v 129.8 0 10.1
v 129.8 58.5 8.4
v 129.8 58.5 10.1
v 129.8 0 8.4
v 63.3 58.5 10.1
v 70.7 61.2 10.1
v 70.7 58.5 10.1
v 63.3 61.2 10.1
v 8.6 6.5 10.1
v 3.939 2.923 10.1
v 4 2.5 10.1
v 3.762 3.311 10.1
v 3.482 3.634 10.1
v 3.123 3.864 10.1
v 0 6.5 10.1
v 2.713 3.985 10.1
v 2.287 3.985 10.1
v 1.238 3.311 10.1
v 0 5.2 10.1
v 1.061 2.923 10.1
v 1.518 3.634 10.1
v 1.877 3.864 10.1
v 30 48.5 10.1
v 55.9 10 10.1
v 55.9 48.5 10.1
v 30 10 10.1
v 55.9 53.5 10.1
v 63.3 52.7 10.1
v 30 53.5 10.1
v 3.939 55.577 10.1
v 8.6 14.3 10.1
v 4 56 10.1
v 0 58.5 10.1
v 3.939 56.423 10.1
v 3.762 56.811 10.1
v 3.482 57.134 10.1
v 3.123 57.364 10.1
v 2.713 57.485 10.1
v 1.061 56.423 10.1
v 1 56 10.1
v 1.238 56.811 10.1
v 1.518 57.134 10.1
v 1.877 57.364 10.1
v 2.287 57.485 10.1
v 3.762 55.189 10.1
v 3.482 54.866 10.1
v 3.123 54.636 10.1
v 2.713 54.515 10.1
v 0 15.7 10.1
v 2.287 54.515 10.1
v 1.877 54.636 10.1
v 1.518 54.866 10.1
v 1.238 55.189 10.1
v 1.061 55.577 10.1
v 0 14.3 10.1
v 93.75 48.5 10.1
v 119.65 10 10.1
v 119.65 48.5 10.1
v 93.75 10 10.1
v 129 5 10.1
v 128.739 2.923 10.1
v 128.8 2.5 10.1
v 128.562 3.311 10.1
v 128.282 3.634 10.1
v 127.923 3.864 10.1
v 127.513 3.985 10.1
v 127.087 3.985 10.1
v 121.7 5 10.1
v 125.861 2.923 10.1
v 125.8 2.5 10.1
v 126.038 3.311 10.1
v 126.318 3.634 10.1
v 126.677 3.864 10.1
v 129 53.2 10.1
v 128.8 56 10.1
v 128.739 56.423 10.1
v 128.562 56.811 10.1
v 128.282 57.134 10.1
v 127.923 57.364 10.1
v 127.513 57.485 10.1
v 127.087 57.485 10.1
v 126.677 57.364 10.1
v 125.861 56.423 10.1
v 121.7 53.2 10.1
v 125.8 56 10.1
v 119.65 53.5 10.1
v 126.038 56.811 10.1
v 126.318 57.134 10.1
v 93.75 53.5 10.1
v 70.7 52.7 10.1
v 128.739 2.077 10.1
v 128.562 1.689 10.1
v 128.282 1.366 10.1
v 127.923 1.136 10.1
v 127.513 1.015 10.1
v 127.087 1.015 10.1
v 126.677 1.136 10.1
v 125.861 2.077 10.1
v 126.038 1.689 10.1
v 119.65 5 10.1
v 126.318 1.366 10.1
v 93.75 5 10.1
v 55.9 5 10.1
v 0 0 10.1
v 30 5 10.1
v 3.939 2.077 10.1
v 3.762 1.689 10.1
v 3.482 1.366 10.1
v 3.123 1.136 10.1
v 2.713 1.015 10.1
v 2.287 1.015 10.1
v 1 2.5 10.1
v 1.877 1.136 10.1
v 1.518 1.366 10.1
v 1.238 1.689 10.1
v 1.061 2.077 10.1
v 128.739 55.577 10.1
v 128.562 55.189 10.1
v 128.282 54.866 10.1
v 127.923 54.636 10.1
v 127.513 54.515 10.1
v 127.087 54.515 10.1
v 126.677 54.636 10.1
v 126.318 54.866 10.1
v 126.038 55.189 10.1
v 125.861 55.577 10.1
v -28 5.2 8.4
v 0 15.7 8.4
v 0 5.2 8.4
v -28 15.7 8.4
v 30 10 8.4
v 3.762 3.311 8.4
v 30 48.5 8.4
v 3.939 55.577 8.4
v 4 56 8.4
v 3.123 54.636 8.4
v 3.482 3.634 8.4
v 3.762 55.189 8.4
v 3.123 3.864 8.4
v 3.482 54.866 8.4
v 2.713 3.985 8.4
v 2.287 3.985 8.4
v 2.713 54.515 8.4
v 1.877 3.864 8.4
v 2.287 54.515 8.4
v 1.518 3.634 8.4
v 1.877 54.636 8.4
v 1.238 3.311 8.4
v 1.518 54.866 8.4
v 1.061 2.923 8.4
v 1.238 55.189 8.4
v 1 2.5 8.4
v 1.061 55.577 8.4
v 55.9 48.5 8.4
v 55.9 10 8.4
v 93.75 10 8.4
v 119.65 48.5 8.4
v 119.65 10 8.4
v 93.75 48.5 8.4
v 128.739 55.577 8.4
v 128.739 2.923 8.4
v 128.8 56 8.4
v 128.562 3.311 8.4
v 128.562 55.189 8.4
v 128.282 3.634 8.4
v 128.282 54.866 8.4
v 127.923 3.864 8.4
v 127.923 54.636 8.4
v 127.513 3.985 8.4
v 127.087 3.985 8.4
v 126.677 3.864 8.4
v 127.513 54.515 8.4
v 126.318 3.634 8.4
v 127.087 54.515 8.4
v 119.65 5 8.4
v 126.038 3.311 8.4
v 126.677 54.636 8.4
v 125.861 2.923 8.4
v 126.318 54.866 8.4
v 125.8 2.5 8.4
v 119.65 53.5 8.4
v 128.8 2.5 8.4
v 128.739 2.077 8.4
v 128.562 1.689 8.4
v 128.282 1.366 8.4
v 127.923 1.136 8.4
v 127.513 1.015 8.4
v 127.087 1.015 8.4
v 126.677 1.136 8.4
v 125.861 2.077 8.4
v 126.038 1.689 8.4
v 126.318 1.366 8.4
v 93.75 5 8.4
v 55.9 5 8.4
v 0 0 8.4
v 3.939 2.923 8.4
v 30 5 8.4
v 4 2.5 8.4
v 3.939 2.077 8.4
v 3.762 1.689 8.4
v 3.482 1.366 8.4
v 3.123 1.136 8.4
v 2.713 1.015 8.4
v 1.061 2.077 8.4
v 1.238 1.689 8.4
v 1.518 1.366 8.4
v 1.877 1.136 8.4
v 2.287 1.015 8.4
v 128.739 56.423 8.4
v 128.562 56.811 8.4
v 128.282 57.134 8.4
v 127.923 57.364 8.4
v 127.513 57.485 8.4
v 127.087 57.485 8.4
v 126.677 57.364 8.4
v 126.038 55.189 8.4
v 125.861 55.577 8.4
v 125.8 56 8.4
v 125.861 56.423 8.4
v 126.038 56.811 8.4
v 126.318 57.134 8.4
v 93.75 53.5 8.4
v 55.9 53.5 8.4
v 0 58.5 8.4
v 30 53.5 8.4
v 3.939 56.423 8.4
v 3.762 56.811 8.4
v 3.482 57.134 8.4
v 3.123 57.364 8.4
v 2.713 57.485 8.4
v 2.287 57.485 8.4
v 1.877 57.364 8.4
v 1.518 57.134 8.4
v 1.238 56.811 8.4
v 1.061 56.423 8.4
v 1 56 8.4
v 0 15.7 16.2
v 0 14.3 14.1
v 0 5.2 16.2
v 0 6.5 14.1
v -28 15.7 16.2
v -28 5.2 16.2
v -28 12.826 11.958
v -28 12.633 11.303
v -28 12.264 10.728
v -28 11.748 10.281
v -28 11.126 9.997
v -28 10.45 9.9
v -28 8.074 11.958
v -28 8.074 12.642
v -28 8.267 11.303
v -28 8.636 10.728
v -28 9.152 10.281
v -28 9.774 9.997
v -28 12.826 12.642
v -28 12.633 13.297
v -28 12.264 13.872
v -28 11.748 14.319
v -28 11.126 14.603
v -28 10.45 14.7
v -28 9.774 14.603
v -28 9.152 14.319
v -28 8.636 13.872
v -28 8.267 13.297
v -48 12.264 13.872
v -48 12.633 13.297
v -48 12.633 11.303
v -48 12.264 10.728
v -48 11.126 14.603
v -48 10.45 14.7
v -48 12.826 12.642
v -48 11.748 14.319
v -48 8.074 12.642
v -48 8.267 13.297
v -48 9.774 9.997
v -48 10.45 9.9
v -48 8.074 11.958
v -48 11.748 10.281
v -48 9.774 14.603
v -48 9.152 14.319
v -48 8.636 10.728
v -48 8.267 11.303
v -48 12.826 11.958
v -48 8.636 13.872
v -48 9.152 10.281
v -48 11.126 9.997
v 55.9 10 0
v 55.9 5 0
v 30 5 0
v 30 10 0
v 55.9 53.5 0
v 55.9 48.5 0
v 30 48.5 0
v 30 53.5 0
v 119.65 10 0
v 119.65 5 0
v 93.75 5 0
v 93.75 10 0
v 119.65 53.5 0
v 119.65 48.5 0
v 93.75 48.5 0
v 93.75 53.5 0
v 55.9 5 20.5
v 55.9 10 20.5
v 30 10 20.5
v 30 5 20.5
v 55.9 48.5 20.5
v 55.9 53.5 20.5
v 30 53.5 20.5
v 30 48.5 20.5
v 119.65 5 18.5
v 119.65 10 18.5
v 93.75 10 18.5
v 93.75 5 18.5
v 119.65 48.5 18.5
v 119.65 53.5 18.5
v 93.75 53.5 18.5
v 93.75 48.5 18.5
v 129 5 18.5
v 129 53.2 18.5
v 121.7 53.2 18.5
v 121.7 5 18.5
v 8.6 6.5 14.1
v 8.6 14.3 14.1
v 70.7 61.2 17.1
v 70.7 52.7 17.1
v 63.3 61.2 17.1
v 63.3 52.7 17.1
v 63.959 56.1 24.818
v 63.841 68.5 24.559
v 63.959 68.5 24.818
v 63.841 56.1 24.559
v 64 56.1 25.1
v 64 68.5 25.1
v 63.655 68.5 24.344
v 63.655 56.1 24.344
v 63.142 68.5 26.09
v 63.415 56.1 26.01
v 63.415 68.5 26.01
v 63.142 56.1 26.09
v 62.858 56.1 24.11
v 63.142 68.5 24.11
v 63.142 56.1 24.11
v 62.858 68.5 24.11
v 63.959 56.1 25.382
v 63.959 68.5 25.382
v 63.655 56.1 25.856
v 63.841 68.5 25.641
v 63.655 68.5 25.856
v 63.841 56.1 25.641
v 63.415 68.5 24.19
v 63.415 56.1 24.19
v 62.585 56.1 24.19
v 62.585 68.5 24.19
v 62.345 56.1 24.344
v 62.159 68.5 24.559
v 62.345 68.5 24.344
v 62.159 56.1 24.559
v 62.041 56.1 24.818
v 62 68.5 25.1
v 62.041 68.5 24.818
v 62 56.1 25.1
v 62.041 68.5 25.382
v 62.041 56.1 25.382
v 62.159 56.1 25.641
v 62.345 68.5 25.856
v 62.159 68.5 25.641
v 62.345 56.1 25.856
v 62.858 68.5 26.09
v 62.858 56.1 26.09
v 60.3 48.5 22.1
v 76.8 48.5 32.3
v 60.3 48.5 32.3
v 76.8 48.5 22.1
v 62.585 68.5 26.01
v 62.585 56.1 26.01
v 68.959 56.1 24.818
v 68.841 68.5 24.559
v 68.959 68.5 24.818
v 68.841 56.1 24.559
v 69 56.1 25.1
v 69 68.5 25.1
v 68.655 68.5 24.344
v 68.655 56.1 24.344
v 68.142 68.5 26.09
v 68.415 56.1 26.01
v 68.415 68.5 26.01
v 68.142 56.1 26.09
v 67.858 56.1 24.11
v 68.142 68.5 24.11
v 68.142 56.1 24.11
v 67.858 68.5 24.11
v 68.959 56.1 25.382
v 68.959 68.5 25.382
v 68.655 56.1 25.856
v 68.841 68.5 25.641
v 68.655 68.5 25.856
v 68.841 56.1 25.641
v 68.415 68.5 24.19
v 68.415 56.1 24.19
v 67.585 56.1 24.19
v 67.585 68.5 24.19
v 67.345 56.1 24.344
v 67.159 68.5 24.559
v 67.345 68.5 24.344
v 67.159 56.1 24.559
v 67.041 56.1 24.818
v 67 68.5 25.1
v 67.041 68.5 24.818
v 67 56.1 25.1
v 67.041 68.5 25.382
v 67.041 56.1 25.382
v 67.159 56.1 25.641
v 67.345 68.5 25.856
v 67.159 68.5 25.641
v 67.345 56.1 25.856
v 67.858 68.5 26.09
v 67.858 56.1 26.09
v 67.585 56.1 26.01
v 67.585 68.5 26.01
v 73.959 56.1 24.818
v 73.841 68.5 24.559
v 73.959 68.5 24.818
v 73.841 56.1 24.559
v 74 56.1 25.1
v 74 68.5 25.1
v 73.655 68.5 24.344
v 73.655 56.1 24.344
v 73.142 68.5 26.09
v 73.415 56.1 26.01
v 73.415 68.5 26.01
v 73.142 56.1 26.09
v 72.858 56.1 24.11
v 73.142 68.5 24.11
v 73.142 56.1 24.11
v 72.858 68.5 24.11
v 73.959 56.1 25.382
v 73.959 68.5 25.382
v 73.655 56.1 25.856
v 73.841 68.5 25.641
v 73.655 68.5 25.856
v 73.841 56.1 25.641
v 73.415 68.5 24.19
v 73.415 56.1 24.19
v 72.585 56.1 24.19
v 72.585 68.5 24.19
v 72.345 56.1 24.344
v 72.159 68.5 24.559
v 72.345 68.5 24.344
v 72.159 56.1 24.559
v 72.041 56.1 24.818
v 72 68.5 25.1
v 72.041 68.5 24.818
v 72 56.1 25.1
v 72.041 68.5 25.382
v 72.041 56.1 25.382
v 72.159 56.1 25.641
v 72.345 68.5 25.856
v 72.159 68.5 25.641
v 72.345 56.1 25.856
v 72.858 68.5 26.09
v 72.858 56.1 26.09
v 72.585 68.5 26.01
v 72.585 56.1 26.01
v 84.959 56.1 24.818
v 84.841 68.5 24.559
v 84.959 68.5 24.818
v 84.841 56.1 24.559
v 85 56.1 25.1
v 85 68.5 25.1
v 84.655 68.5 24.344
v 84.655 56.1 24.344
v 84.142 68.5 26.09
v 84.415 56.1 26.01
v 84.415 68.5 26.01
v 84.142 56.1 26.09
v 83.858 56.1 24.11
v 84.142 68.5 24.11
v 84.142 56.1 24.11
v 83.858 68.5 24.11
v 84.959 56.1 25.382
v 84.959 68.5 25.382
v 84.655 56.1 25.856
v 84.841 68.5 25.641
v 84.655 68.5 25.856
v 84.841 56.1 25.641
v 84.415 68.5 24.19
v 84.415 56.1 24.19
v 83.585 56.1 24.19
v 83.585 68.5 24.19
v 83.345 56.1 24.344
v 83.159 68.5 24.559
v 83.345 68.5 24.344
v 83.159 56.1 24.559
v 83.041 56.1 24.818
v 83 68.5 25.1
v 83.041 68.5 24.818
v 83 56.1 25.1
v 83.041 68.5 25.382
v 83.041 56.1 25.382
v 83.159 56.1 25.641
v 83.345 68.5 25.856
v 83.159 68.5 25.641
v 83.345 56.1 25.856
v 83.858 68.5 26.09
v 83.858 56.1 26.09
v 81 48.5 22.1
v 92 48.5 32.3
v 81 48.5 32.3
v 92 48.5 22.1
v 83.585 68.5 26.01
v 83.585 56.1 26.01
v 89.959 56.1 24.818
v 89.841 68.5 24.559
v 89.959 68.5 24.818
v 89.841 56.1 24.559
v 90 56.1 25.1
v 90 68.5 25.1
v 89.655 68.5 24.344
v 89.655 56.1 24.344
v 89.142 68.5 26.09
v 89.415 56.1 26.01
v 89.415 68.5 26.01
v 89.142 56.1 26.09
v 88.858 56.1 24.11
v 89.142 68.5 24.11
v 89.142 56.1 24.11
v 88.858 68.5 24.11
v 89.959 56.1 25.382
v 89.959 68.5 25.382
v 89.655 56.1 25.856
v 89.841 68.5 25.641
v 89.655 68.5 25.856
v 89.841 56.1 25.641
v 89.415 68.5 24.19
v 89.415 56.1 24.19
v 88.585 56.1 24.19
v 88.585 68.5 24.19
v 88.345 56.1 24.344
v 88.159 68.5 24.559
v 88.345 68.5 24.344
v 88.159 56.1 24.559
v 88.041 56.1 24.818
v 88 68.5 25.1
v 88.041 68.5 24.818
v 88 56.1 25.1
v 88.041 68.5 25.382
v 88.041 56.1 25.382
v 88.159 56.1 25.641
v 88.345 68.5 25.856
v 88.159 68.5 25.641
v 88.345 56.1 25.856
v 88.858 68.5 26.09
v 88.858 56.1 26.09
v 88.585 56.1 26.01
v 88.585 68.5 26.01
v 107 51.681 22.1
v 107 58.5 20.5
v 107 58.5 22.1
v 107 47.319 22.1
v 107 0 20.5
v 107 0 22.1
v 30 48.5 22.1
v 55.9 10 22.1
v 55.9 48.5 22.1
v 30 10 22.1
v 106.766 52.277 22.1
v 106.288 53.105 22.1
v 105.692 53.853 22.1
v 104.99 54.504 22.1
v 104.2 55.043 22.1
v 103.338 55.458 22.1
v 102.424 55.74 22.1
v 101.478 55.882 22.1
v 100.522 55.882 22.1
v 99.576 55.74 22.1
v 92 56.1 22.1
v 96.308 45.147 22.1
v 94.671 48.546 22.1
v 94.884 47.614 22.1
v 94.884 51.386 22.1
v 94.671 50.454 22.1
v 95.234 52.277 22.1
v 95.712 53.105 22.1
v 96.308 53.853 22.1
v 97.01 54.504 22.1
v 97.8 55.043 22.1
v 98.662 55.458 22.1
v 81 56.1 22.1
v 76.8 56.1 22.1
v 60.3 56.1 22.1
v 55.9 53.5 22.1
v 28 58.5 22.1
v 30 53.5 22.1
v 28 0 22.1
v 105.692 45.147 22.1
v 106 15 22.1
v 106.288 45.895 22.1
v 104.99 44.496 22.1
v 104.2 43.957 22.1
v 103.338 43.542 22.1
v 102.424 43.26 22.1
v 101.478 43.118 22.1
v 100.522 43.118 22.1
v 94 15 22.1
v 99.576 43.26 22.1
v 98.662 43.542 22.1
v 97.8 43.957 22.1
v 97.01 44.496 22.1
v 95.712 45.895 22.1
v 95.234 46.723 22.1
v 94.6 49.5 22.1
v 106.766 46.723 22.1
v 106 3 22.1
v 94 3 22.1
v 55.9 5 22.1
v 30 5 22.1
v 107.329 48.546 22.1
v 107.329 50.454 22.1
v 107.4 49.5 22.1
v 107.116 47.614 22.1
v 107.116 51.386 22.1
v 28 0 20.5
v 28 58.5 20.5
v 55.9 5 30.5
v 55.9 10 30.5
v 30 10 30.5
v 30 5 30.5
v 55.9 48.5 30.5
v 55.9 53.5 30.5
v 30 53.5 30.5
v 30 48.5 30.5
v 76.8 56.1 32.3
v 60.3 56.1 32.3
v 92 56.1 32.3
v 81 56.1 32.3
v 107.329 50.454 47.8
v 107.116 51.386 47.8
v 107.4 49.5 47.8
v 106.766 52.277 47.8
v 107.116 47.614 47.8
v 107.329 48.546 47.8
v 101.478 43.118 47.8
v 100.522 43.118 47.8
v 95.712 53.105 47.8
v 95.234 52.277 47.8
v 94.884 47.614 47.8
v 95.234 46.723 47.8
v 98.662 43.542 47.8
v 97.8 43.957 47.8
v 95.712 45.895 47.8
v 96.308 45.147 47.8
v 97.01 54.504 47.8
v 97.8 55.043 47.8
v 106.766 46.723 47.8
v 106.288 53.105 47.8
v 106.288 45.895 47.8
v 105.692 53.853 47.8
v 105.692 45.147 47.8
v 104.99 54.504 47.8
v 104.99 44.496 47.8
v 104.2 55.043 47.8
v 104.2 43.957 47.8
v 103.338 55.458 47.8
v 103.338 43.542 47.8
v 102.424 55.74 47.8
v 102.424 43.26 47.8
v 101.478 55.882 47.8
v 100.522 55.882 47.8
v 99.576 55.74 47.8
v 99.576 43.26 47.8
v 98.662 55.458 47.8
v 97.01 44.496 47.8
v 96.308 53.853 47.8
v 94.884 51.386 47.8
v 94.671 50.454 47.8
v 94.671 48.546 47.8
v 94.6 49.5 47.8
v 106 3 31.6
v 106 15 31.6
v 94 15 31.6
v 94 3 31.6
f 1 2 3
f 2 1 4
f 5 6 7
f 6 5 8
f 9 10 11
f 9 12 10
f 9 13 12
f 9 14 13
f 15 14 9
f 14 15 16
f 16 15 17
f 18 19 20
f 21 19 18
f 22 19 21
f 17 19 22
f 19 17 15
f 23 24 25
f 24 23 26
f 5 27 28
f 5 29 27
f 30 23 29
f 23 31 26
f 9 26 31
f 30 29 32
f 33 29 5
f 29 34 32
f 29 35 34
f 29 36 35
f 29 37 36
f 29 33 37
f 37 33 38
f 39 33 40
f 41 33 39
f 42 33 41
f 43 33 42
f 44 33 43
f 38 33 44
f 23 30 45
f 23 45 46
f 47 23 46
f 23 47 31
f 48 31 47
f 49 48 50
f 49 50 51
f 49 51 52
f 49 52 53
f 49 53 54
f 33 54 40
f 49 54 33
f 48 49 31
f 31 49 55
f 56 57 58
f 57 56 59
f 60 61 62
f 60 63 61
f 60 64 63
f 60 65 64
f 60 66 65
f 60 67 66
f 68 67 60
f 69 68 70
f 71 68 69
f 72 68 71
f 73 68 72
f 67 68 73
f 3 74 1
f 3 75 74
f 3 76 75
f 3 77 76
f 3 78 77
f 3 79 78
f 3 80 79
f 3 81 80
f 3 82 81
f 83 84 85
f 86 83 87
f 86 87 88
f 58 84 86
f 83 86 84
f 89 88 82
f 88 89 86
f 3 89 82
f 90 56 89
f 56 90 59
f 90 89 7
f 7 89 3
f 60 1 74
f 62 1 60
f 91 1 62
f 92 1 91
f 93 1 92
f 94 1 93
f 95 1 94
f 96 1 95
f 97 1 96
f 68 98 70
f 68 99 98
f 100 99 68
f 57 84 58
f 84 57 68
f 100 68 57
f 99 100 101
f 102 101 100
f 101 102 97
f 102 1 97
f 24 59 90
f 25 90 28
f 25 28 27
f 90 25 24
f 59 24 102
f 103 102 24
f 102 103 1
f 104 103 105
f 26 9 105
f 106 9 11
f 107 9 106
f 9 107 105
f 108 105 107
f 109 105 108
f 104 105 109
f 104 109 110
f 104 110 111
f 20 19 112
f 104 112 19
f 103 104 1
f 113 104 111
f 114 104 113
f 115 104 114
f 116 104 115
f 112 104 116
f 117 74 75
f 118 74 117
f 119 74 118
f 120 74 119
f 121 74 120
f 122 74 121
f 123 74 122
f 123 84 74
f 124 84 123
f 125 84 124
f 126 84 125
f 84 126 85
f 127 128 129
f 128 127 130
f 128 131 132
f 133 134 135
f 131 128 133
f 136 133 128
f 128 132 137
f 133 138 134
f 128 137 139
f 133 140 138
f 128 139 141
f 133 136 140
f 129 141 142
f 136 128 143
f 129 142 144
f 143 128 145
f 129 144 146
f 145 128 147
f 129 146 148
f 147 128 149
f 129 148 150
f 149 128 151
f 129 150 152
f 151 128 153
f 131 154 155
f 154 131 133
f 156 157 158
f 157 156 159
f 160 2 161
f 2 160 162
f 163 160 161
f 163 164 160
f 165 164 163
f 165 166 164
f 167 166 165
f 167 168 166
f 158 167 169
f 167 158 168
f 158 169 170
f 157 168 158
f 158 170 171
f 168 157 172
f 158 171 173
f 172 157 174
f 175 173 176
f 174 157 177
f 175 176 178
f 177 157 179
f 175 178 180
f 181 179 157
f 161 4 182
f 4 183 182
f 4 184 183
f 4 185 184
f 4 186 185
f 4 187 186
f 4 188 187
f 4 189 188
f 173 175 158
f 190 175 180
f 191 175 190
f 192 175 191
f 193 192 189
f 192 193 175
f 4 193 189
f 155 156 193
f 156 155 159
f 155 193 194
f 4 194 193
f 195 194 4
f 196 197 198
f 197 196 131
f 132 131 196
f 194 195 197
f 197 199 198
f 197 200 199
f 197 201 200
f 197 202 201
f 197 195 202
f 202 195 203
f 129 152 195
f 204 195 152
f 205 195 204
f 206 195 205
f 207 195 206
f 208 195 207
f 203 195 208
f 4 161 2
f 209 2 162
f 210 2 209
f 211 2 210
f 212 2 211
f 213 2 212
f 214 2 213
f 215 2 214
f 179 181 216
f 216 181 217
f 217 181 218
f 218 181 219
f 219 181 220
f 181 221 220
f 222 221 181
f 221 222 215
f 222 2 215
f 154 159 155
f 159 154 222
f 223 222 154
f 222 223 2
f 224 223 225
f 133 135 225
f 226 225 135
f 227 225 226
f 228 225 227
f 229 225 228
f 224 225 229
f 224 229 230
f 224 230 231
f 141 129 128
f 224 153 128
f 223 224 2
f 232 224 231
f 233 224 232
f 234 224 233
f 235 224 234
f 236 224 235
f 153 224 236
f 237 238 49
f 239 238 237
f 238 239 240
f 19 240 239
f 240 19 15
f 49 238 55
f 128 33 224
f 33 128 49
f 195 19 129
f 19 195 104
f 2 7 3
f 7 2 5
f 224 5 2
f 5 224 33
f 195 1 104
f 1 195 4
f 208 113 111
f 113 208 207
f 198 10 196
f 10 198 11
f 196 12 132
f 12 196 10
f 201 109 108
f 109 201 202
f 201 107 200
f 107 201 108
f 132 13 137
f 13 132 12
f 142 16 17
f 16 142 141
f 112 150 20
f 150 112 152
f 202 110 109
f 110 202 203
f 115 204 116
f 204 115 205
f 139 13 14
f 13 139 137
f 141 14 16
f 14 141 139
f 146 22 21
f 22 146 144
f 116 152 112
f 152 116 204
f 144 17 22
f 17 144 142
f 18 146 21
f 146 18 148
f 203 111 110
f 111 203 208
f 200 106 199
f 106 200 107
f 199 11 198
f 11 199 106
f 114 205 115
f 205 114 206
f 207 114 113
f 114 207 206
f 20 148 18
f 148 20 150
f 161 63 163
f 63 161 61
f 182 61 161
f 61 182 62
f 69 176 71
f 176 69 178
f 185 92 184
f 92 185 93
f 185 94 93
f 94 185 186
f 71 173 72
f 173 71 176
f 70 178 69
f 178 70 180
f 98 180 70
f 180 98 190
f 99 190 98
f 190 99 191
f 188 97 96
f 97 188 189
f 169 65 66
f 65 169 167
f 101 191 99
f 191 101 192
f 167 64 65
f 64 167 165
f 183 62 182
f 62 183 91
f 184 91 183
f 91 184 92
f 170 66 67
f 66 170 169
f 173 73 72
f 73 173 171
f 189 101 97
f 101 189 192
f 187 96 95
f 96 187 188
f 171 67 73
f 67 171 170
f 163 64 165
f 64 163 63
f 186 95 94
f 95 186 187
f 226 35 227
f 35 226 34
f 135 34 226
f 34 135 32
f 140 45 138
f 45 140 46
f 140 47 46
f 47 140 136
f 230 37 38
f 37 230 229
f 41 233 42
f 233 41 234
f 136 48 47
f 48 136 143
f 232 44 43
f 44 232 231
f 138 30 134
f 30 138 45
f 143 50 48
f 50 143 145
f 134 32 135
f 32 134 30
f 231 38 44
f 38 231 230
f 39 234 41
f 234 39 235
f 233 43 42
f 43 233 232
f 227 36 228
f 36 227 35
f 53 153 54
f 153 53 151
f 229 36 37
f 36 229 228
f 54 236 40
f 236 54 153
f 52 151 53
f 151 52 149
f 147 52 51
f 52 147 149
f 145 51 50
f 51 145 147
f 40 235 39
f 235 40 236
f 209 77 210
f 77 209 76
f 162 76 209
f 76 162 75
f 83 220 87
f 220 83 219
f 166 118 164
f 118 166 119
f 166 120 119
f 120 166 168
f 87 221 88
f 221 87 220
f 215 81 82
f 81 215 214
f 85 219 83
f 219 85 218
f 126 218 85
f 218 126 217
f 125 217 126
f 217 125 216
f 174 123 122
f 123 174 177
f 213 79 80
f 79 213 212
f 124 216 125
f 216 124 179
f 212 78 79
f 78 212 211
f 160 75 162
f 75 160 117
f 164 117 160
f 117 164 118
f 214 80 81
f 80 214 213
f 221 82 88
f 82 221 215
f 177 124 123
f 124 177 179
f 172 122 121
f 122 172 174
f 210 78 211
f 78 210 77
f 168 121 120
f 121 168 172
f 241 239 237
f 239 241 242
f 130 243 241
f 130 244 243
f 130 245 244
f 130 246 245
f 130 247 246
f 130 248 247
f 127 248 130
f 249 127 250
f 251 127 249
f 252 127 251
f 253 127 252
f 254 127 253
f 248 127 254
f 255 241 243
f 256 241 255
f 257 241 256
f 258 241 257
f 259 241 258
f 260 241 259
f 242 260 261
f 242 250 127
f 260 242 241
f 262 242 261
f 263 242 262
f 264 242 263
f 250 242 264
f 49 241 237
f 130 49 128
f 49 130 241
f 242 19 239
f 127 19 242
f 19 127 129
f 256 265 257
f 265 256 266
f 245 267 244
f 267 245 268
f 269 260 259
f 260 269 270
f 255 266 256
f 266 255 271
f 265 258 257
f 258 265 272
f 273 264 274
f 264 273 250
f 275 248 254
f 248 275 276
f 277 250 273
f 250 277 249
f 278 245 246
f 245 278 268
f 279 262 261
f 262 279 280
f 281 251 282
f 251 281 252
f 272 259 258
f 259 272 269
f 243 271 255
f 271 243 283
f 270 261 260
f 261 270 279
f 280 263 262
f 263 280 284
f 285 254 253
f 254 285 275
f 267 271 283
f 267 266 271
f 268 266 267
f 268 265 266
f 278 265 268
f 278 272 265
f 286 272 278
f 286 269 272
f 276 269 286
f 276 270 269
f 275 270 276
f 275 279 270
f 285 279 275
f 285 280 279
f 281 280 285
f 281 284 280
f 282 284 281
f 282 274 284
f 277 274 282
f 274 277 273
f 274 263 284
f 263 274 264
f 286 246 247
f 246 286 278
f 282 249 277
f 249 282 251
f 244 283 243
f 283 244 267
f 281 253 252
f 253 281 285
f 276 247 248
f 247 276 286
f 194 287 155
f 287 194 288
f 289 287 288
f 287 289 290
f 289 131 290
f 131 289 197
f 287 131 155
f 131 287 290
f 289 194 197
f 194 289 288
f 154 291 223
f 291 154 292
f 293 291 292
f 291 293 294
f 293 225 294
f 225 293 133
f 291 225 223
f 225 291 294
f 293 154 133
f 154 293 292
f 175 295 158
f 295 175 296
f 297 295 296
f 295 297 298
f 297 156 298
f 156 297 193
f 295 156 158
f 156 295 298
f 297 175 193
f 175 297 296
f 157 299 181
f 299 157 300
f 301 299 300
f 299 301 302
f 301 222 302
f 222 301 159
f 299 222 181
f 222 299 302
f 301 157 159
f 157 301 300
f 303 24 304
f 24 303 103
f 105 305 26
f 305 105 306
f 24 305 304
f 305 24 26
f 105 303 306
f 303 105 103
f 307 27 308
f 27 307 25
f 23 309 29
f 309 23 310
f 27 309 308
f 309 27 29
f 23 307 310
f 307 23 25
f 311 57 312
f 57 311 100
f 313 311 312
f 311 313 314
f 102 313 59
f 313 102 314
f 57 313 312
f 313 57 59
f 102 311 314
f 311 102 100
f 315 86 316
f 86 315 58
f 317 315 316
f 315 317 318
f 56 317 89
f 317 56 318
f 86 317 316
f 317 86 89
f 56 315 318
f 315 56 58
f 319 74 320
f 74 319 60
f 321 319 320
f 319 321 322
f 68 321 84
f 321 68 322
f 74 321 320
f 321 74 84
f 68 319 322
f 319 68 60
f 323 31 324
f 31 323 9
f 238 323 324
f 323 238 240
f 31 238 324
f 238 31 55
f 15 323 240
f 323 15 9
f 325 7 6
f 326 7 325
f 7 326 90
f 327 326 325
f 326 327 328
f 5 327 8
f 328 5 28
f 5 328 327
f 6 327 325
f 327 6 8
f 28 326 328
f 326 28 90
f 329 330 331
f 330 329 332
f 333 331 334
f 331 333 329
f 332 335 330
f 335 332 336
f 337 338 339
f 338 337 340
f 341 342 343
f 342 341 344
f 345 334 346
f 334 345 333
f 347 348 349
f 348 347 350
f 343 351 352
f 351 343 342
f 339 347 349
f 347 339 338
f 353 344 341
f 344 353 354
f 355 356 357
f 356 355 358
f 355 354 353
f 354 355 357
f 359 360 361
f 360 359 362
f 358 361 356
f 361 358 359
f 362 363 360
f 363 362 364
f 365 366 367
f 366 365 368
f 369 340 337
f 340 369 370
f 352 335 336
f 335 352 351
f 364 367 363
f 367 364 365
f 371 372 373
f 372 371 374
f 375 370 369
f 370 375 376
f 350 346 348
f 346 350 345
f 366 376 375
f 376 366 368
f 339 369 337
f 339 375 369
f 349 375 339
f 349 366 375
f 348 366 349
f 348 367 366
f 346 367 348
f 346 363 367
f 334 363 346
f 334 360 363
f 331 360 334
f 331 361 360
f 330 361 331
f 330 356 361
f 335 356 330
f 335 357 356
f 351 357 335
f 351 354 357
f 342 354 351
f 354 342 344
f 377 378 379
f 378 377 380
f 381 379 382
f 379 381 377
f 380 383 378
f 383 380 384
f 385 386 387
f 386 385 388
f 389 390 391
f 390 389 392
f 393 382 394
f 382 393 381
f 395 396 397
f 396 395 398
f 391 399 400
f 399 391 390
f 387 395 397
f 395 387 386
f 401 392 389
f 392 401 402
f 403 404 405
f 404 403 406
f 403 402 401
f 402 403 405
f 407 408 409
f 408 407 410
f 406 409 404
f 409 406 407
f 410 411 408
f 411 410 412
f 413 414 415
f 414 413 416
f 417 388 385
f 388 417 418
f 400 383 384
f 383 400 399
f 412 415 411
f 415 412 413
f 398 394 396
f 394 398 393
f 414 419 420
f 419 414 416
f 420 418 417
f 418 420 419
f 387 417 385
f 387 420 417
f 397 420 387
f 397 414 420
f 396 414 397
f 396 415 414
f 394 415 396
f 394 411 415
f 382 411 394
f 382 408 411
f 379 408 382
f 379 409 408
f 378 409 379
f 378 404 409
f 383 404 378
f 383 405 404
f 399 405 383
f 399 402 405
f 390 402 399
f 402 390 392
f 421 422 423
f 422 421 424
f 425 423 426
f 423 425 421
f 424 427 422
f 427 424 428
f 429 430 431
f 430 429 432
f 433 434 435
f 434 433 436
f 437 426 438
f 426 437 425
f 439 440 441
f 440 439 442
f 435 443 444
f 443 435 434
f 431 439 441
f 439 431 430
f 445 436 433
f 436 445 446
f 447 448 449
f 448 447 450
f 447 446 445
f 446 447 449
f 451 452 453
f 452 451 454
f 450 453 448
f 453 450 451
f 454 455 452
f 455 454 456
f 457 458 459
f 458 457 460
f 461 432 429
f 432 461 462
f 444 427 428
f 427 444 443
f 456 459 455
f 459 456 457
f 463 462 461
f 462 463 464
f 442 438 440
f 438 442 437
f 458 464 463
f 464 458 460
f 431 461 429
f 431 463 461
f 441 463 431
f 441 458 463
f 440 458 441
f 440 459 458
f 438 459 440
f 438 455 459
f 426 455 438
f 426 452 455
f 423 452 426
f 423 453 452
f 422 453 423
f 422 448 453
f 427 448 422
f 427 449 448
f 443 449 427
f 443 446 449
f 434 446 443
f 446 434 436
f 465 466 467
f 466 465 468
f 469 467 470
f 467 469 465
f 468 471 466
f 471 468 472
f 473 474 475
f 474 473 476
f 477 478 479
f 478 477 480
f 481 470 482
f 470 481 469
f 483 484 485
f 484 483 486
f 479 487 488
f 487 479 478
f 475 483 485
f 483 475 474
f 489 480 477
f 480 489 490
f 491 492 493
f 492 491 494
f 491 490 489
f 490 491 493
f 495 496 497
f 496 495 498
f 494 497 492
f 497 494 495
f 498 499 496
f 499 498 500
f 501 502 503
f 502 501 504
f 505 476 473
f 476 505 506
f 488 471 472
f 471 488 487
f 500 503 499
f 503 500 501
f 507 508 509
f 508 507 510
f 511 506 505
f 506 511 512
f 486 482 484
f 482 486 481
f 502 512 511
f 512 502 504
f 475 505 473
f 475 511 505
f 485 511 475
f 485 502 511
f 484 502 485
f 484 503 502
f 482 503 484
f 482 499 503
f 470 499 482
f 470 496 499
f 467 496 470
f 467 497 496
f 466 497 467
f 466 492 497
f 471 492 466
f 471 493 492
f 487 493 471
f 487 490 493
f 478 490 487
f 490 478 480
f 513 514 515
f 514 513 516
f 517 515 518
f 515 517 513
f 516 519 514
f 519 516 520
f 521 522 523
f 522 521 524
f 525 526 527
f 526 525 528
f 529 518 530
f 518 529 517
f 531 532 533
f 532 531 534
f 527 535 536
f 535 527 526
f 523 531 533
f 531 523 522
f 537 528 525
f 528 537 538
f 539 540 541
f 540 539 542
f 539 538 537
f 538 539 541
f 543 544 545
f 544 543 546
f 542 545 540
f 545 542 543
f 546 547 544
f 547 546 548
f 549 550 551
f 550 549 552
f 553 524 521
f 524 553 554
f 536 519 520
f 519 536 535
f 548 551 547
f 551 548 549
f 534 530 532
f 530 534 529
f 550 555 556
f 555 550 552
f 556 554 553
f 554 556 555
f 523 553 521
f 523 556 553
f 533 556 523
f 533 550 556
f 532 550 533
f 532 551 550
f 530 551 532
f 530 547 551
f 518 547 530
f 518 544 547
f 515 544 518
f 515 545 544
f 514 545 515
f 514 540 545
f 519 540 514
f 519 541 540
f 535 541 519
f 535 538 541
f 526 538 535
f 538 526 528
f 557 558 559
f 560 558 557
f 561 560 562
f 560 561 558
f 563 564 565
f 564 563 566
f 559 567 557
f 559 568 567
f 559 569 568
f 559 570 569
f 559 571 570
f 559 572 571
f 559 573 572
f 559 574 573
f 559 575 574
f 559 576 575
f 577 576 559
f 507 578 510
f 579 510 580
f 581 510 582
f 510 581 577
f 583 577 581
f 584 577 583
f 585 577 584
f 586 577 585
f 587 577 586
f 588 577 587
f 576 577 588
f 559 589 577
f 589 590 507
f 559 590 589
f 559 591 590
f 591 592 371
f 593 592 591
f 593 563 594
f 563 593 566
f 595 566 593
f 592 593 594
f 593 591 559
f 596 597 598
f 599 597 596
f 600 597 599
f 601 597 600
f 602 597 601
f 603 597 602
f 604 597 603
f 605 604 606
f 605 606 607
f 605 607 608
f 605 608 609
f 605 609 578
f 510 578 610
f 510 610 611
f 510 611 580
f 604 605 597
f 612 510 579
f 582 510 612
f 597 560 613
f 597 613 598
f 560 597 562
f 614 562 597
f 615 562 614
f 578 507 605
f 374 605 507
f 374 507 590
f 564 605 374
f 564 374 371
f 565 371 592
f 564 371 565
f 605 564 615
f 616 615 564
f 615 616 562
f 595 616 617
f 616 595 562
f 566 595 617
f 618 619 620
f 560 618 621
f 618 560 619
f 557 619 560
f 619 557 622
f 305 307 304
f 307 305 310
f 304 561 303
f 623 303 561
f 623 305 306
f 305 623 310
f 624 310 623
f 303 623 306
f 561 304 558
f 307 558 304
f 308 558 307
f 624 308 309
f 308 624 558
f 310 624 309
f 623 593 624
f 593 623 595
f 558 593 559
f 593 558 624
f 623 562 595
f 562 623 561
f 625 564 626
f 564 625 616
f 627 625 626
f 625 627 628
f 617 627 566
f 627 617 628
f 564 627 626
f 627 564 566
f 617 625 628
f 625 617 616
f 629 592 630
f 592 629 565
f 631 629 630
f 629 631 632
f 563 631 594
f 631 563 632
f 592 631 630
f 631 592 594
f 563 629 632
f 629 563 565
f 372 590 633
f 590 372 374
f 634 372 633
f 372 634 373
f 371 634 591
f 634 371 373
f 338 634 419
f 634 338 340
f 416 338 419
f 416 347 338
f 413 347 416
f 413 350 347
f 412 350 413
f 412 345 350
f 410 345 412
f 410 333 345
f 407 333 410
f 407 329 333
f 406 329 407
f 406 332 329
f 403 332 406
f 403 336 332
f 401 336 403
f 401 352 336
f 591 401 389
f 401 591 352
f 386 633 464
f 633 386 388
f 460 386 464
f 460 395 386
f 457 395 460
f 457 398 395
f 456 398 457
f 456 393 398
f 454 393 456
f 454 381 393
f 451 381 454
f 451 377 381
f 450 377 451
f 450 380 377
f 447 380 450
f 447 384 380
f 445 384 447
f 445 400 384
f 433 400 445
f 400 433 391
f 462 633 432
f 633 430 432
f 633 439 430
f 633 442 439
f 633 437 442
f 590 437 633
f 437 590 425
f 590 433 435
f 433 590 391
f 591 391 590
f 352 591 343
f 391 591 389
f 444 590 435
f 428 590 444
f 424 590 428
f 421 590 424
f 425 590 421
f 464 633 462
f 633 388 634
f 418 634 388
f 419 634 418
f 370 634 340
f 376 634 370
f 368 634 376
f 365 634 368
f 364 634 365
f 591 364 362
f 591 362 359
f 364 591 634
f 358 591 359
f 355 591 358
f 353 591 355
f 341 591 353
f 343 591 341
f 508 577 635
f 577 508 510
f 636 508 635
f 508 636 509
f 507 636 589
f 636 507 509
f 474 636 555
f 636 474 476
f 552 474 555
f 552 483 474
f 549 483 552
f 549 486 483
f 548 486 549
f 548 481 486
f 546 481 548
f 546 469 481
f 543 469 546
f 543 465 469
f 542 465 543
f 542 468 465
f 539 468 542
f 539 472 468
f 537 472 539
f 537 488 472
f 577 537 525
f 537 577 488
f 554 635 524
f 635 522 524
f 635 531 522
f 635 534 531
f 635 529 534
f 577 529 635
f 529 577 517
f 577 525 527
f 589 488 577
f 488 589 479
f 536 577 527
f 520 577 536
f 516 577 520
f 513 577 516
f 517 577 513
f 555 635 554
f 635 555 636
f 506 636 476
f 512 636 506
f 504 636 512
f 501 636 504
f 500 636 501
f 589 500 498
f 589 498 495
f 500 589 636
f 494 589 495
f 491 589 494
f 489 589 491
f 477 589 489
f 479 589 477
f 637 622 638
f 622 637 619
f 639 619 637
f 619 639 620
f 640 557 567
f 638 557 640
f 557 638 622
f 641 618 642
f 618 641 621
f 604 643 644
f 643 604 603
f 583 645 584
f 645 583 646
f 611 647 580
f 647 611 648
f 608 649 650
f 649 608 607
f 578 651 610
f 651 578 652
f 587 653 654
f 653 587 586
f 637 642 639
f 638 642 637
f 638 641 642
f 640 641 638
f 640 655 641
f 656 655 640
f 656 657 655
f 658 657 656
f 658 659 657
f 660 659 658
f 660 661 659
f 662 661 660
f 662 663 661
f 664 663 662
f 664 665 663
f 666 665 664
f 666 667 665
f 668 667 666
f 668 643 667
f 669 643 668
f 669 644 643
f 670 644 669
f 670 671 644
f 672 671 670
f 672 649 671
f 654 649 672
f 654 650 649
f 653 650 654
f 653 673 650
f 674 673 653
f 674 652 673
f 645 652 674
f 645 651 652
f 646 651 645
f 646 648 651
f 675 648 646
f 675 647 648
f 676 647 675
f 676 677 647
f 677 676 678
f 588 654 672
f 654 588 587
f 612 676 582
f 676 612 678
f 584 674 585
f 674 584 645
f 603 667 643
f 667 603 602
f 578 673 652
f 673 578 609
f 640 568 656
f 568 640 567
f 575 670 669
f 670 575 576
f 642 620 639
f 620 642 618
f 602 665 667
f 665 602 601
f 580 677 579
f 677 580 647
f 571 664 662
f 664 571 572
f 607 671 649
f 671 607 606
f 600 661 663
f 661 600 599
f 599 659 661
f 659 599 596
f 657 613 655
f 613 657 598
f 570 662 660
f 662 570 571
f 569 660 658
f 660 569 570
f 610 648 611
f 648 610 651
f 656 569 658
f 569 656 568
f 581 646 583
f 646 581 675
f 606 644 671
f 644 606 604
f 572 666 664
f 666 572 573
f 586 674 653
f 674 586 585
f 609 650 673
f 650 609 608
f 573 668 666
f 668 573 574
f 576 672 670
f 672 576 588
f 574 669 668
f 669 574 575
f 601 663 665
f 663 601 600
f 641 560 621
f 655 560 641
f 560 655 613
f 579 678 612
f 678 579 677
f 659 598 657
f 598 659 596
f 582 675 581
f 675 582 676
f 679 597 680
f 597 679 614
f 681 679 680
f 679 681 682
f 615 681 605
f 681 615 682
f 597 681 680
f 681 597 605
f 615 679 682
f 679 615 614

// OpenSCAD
// file: rounder.scad
// rounder.scad
// cutting tool for rounding off corners with a cylinder

//---------------------
module rounder(
r=10,   // radius
h=10,   // height
f=22,    // $fn
extra=0.01  // extra size for the cube
){

difference(){
  translate([-extra,-extra,-extra])
  cube([r+extra,r+extra,h+2*extra]);
  translate([r,r,-1])
  cylinder(r=r,h=h+2,$fn=f);
}

}

//---------------------------------------------------------------------------
module bevel(x=1,y=1,h=10){

linear_extrude(height=h)
polygon(points=[[0,0],[x,0],[0,y]]);
    
}
  

//========================

rounder();

//========================
// main file
//=================================================================================
// ti.scad
//
// TI LaunchpadXL and BoostXL GaN inverter
//
// Dr Tom Flint, 17 Nov 2021
//=================================================================================


use <../Parts/rounder.scad>

//---------------------------------------------------------------------
module launch(tol=0,usb=1){


  // pcb
  difference(){
    color("DarkMagenta")
    translate([0,0,8.4])
    cube([129.8,58.5,1.7]);
    
    // mounting holes
    translate([2.5,2.5,0])
    cylinder(r=1.5,h=20,$fn=22);
    translate([129.8-2.5,2.5,0])
    cylinder(r=1.5,h=20,$fn=22);
    translate([2.5,58.5-2.5,0])
    cylinder(r=1.5,h=20,$fn=22);
    translate([129.8-2.5,58.5-2.5,0])
    cylinder(r=1.5,h=20,$fn=22);

  }
  
  // bottom side headers, from measurement not drawings
  color("black")
  translate([30,5,0])
  cube([25.9,5.0,8.4]);
  color("black")
  translate([30,48.5,0])
  cube([25.9,5.0,8.4]);
  color("black")
  translate([93.75,5,0])
  cube([25.9,5.0,8.4]);
  color("black")
  translate([93.75,48.5,0])
  cube([25.9,5.0,8.4]);

  // top side headers, from measurement not drawings
  color("gray")
  translate([30,5,8.4+1.7])
  cube([25.9,5.0,8.4]);
  color("gray")
  translate([30,48.5,8.4+1.7])
  cube([25.9,5.0,8.4]);
  color("gray")
  translate([93.75,5,8.4+1.7])
  cube([25.9,5.0,8.4]);
  color("gray")
  translate([93.75,48.5,8.4+1.7])
  cube([25.9,5.0,8.4]);

  // end row of pins
  color("gray")
  translate([121.7,5,8.4+1.7])
  cube([7.3,48.2,8.4]);

  // usb plug
  color("silver")
  translate([-1,6.5,8.4+1.7])
  cube([9.6,7.8,4.0]);

  // reset button
  color("black")
  translate([63.3,52.7,8.4+1.7])
  cube([7.4,8.5,7.0]);
  
  // usb cable
  if(usb==1){
    color("black")
    translate([-28,5.2,8.4])
    cube([28,10.5,7.8]);
    translate([-28,5.2+10.5/2,8.4+7.8/2])
    rotate([0,-90,0])
    cylinder(r=2.4,h=20,$fn=22);
  }
    
}
//---------------------------------------------------------------------
module gan(tol=0,wires=1){

// for placement on launch()
translate([28.0,0,20.5]){


  // pcb
  difference(){
    color("Green")
    cube([79.0,58.5,1.6]);

  }

  // top side headers, from measurement not drawings
  color("gray")
  translate([2,5,1.6])
  cube([25.9,5.0,8.4]);
  color("gray")
  translate([2,48.5,1.6])
  cube([25.9,5.0,8.4]);

  // bottom side headers, from measurement not drawings
  color("gray")
  translate([2,5,-8.4])
  cube([25.9,5.0,8.4]);
  color("gray")
  translate([2,48.5,-8.4])
  cube([25.9,5.0,8.4]);

  // power lines
  color("DeepSkyBlue")
  translate([32.3,48.5,1.6])
  cube([16.5,7.6,10.2]);

  color("DeepSkyBlue")
  translate([53.0,48.5,1.6])
  cube([11,7.6,10.2]);
  
  // big stupid cap
  color("brown")
  translate([73,49.5,1.6])
  cylinder(r=12.8/2,h=25.7,$fn=42);
  
  // inductor
  color("DarkSlateGray")
  translate([66,3,1.6])
  cube([12,12,9.5]);
  
  // wires
  if(wires>0){
    color("black")
    translate([35,48.5,1.6+3])
    rotate([-90,0,0])
    cylinder(r=1.0,h=20,$fn=22);
    color("red")
    translate([40,48.5,1.6+3])
    rotate([-90,0,0])
    cylinder(r=1.0,h=20,$fn=22);
    color("white")
    translate([45,48.5,1.6+3])
    rotate([-90,0,0])
    cylinder(r=1.0,h=20,$fn=22);

    color("black")
    translate([56,48.5,1.6+3])
    rotate([-90,0,0])
    cylinder(r=1.0,h=20,$fn=22);
    color("red")
    translate([61,48.5,1.6+3])
    rotate([-90,0,0])
    cylinder(r=1.0,h=20,$fn=22);
  }
  
  if(wires>1){
    color("silver")
    translate([26.5,48.5-40,1.6+12])
    rotate([-90,0,0])
    cylinder(r=1.0,h=60,$fn=22);
    translate([4,48.5-40,1.6+12])
    rotate([-90,0,0])
    cylinder(r=1.0,h=60,$fn=22);

    translate([26.5,48.5-40,1.6+20])
    rotate([-90,0,0])
    cylinder(r=1.0,h=60,$fn=22);
    translate([4,48.5-40,1.6+20])
    rotate([-90,0,0])
    cylinder(r=1.0,h=60,$fn=22);

    
  }
}

}

//=================================================================================
  
launch();
gan();

//=================================================================================
